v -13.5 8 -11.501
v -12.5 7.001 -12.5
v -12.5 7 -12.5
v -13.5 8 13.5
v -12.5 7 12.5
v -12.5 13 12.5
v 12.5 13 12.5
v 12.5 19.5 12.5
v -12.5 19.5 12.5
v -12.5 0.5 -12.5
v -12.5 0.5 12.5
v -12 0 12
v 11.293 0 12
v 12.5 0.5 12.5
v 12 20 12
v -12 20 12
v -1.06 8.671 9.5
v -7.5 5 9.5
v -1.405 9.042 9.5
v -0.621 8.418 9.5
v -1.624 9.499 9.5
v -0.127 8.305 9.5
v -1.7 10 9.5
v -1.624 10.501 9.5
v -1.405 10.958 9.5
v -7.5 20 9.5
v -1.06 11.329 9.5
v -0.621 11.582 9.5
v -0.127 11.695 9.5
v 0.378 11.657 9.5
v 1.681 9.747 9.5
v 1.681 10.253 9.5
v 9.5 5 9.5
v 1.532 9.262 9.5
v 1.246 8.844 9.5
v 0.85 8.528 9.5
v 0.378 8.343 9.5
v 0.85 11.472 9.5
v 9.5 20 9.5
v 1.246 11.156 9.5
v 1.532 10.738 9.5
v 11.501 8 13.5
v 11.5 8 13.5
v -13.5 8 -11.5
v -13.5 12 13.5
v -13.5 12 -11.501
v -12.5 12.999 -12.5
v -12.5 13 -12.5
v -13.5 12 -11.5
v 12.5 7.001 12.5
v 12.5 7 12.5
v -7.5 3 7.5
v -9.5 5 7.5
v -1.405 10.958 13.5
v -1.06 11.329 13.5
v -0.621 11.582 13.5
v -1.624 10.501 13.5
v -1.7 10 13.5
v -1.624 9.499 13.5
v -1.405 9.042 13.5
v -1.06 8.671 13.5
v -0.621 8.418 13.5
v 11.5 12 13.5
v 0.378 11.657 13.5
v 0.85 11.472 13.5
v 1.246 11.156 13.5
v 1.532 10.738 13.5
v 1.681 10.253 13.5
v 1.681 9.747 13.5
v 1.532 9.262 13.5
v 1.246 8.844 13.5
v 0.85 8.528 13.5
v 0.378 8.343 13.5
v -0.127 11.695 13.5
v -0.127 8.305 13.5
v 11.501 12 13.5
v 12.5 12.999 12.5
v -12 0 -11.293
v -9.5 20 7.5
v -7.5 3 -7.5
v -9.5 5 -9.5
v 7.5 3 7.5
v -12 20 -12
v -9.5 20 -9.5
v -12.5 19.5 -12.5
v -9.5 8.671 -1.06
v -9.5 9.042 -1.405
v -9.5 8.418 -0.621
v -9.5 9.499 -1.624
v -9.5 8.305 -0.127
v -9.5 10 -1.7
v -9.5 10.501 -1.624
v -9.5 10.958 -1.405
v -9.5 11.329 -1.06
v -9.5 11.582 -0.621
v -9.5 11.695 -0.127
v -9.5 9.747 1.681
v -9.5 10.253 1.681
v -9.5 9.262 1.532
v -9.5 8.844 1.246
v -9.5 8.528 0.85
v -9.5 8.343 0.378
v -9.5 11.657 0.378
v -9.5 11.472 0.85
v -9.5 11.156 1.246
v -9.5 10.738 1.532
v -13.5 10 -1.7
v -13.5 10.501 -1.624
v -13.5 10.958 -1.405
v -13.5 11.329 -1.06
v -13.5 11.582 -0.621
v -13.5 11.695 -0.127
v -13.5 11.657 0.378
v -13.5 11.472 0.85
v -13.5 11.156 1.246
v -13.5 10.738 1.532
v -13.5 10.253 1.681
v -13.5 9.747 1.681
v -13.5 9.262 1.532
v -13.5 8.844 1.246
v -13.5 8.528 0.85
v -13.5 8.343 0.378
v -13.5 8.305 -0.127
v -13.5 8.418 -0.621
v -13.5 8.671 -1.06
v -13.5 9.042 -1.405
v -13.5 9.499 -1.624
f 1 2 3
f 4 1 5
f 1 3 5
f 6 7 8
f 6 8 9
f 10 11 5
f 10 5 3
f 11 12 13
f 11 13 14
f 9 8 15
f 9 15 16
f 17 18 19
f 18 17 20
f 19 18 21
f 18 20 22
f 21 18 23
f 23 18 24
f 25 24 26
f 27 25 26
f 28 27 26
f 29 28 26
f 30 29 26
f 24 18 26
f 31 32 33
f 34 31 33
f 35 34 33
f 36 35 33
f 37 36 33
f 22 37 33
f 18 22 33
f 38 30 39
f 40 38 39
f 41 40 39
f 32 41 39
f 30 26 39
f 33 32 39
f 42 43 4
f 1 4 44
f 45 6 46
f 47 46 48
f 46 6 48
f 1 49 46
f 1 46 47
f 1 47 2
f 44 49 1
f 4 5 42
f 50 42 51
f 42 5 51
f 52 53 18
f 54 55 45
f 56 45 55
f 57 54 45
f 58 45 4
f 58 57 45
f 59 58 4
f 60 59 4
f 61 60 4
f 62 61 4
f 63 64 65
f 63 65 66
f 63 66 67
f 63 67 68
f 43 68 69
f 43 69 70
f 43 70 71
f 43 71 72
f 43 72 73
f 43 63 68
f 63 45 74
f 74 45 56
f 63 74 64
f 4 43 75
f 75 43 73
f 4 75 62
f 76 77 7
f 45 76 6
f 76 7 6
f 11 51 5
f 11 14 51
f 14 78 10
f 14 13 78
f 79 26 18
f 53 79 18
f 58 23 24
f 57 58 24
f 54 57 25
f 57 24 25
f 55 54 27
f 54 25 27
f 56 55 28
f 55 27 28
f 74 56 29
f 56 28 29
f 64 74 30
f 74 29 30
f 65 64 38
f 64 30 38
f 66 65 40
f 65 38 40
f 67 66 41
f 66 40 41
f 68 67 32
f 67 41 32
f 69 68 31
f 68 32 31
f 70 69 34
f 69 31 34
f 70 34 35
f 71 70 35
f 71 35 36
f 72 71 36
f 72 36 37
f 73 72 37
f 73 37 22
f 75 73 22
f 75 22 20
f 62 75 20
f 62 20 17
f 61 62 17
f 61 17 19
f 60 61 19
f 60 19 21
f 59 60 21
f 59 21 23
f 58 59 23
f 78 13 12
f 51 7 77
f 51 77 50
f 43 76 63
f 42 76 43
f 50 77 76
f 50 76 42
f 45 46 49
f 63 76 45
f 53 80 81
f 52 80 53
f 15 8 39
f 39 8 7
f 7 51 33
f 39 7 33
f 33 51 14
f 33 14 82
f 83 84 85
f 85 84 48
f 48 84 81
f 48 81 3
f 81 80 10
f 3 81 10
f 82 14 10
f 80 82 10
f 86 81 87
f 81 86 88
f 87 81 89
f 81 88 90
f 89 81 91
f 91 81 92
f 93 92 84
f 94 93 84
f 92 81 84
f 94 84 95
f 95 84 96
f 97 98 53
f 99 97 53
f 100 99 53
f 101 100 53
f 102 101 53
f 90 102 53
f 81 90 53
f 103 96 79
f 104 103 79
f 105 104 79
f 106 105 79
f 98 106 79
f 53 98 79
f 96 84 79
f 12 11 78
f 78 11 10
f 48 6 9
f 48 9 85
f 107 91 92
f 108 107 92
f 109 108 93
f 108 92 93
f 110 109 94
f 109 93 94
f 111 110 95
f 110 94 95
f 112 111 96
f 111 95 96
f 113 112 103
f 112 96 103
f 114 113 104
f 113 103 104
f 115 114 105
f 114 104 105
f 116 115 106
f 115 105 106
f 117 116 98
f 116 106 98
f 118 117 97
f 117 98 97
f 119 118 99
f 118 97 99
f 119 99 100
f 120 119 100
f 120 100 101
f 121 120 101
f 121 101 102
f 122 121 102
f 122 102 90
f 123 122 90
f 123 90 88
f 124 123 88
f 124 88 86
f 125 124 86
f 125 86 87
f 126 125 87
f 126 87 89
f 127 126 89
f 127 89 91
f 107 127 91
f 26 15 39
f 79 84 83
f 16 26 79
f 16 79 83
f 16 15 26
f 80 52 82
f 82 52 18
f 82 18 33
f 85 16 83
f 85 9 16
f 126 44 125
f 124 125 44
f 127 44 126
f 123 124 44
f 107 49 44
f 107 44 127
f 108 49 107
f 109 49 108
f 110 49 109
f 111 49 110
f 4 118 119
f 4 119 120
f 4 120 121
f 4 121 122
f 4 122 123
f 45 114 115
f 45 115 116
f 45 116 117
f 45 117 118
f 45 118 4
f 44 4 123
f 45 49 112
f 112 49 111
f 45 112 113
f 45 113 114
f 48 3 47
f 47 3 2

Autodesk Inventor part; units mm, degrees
ref_plane "YZ Plane" through (0, 0, 0) normal (1, 0, 0) x (0, 1, 0)
ref_plane "XZ Plane" through (0, 0, 0) normal (0, 1, 0) x (-1, 0, 0)
ref_plane "XY Plane" through (0, 0, 0) normal (0, 0, 1) x (1, 0, 0)
sketch "Sketch1" plane through (0, 0, 0) normal (0, 1, 0) x (-1, 0, 0)
  line L0 (-12.5, 12.5) -> (12.5, 12.5)
  line L1 (12.5, 12.5) -> (12.5, -12.5)
  line L2 (12.5, -12.5) -> (-12.5, -12.5)
  line L3 (-12.5, -12.5) -> (-12.5, 12.5)
  line L4 (-12.5, 12.5) -> (12.5, -12.5)
  line L5 (12.5, 12.5) -> (-12.5, -12.5) construction
  point P0 (0, 0)
  point P1 (0, 0)
  point P2 (0, 0)
  dimension "d0" = 25
extrude "Extrusion1" add sketch "Sketch1" along normal blind 20 contours L0 L1 L4
sketch "Sketch2" plane through (0, 20, 0) normal (0, 1, 0) x (1, 0, 0)
  line L0 (9.5, 9.5) -> (-9.5, 9.5)
  line L1 (-9.5, 9.5) -> (-9.5, -9.5)
  line L2 (-9.5, -9.5) -> (9.5, -9.5)
  line L3 (9.5, -9.5) -> (9.5, 9.5)
  line L4 (9.5, 9.5) -> (-9.5, -9.5) construction
  line L5 (-9.5, 9.5) -> (9.5, -9.5) construction
  line L6 (-12.5, 12.5) -> (-12.5, -12.5) projected
  line L7 (-12.5, -12.5) -> (12.5, -12.5) projected
  point P0 (0, 0)
  dimension "d3" = 3
  dimension "d4" = 3
extrude "Extrusion2" cut sketch "Sketch2" against normal blind 17
sketch "Sketch5" plane through (-12.5, 0, 12.5) normal (0, 0, 1) x (1, 0, 0)
  line L0 (0, 0) -> (0, 20) construction
  line L1 (0, 10) -> (25, 10) construction
  line L2 (25, 8) -> (0, 8)
  line L3 (0, 8) -> (0, 12)
  line L4 (0, 12) -> (25, 12)
  line L5 (25, 12) -> (25, 8)
  line L6 (25, 8) -> (0, 12) construction
  line L7 (0, 8) -> (25, 12) construction
  line L8 (25, 0) -> (25, 20) projected
  point P0 (12.5, 0)
  point P1 (12.5, 10)
  dimension "d22" = 4
extrude "Extrusion5" add sketch "Sketch5" along normal blind 1
sketch "Sketch6" plane through (-12.5, 0, -12.5) normal (-1, 0, 0) x (0, 0, 1)
  line L0 (25, 8) -> (26, 8) projected
  line L1 (26, 8) -> (0, 8)
  line L2 (0, 8) -> (0, 12)
  line L3 (0, 12) -> (26, 12)
  line L4 (26, 12) -> (26, 8)
  line L5 (0, 0) -> (0, 20) projected
  point P0 (12.5, 0)
extrude "Extrusion6" add sketch "Sketch6" along normal blind 1
chamfer "Chamfer4" distance 1 angle 45 4 edges at (-12.5, 12, 0) (0, 12, 12.5) (0, 8, 12.5) (-12.5, 8, 0)
sketch "Sketch7" plane through (9.5, 20, 9.5) normal (0, 0, -1) x (-1, 0, 0)
  line L0 (19, 0) -> (19, -17) construction
  line L1 (23, -12) -> (23, -8) projected
  line L2 (23, -10) -> (-3, -10) construction
  line L3 (9.5, -20) -> (9.5, 0) construction
  line L4 (0, 0) -> (19, 0) projected
  circle A0 centre (9.5, -10) radius 1.7
  dimension "d30" = 3.4
extrude "Extrusion7" cut sketch "Sketch7" against normal through all
sketch "Sketch8" plane through (-9.5, 20, 9.5) normal (1, 0, 0) x (0, 0, -1)
  line L0 (9.5, -20) -> (9.5, 0) construction
  line L1 (0, 0) -> (19, 0) projected
  line L2 (-1.6609, -10) -> (22, -10) construction
  line L3 (22, -13) -> (22, -7) projected
  circle A0 centre (9.5, -10) radius 1.7
  dimension "d33" = 3.4
extrude "Extrusion8" cut sketch "Sketch8" against normal through all
chamfer "Chamfer5" distance 1 angle 45 2 edges at (12.5, 10, 13.5) (-13.5, 10, -12.5)
chamfer "Chamfer6" distance 2 angle 45 3 edges at (-9.5, 11.5, 9.5) (-9.5, 3, 0) (0, 3, 9.5)
chamfer "Chamfer7" distance 0.5 angle 45 5 edges at (-12.5, 0, 0) (0, 0, 12.5) (0, 0, 0) (-12.5, 20, 0) (0, 20, 12.5)
properties part number "Corner Bracket" material "ABS Plastic"
